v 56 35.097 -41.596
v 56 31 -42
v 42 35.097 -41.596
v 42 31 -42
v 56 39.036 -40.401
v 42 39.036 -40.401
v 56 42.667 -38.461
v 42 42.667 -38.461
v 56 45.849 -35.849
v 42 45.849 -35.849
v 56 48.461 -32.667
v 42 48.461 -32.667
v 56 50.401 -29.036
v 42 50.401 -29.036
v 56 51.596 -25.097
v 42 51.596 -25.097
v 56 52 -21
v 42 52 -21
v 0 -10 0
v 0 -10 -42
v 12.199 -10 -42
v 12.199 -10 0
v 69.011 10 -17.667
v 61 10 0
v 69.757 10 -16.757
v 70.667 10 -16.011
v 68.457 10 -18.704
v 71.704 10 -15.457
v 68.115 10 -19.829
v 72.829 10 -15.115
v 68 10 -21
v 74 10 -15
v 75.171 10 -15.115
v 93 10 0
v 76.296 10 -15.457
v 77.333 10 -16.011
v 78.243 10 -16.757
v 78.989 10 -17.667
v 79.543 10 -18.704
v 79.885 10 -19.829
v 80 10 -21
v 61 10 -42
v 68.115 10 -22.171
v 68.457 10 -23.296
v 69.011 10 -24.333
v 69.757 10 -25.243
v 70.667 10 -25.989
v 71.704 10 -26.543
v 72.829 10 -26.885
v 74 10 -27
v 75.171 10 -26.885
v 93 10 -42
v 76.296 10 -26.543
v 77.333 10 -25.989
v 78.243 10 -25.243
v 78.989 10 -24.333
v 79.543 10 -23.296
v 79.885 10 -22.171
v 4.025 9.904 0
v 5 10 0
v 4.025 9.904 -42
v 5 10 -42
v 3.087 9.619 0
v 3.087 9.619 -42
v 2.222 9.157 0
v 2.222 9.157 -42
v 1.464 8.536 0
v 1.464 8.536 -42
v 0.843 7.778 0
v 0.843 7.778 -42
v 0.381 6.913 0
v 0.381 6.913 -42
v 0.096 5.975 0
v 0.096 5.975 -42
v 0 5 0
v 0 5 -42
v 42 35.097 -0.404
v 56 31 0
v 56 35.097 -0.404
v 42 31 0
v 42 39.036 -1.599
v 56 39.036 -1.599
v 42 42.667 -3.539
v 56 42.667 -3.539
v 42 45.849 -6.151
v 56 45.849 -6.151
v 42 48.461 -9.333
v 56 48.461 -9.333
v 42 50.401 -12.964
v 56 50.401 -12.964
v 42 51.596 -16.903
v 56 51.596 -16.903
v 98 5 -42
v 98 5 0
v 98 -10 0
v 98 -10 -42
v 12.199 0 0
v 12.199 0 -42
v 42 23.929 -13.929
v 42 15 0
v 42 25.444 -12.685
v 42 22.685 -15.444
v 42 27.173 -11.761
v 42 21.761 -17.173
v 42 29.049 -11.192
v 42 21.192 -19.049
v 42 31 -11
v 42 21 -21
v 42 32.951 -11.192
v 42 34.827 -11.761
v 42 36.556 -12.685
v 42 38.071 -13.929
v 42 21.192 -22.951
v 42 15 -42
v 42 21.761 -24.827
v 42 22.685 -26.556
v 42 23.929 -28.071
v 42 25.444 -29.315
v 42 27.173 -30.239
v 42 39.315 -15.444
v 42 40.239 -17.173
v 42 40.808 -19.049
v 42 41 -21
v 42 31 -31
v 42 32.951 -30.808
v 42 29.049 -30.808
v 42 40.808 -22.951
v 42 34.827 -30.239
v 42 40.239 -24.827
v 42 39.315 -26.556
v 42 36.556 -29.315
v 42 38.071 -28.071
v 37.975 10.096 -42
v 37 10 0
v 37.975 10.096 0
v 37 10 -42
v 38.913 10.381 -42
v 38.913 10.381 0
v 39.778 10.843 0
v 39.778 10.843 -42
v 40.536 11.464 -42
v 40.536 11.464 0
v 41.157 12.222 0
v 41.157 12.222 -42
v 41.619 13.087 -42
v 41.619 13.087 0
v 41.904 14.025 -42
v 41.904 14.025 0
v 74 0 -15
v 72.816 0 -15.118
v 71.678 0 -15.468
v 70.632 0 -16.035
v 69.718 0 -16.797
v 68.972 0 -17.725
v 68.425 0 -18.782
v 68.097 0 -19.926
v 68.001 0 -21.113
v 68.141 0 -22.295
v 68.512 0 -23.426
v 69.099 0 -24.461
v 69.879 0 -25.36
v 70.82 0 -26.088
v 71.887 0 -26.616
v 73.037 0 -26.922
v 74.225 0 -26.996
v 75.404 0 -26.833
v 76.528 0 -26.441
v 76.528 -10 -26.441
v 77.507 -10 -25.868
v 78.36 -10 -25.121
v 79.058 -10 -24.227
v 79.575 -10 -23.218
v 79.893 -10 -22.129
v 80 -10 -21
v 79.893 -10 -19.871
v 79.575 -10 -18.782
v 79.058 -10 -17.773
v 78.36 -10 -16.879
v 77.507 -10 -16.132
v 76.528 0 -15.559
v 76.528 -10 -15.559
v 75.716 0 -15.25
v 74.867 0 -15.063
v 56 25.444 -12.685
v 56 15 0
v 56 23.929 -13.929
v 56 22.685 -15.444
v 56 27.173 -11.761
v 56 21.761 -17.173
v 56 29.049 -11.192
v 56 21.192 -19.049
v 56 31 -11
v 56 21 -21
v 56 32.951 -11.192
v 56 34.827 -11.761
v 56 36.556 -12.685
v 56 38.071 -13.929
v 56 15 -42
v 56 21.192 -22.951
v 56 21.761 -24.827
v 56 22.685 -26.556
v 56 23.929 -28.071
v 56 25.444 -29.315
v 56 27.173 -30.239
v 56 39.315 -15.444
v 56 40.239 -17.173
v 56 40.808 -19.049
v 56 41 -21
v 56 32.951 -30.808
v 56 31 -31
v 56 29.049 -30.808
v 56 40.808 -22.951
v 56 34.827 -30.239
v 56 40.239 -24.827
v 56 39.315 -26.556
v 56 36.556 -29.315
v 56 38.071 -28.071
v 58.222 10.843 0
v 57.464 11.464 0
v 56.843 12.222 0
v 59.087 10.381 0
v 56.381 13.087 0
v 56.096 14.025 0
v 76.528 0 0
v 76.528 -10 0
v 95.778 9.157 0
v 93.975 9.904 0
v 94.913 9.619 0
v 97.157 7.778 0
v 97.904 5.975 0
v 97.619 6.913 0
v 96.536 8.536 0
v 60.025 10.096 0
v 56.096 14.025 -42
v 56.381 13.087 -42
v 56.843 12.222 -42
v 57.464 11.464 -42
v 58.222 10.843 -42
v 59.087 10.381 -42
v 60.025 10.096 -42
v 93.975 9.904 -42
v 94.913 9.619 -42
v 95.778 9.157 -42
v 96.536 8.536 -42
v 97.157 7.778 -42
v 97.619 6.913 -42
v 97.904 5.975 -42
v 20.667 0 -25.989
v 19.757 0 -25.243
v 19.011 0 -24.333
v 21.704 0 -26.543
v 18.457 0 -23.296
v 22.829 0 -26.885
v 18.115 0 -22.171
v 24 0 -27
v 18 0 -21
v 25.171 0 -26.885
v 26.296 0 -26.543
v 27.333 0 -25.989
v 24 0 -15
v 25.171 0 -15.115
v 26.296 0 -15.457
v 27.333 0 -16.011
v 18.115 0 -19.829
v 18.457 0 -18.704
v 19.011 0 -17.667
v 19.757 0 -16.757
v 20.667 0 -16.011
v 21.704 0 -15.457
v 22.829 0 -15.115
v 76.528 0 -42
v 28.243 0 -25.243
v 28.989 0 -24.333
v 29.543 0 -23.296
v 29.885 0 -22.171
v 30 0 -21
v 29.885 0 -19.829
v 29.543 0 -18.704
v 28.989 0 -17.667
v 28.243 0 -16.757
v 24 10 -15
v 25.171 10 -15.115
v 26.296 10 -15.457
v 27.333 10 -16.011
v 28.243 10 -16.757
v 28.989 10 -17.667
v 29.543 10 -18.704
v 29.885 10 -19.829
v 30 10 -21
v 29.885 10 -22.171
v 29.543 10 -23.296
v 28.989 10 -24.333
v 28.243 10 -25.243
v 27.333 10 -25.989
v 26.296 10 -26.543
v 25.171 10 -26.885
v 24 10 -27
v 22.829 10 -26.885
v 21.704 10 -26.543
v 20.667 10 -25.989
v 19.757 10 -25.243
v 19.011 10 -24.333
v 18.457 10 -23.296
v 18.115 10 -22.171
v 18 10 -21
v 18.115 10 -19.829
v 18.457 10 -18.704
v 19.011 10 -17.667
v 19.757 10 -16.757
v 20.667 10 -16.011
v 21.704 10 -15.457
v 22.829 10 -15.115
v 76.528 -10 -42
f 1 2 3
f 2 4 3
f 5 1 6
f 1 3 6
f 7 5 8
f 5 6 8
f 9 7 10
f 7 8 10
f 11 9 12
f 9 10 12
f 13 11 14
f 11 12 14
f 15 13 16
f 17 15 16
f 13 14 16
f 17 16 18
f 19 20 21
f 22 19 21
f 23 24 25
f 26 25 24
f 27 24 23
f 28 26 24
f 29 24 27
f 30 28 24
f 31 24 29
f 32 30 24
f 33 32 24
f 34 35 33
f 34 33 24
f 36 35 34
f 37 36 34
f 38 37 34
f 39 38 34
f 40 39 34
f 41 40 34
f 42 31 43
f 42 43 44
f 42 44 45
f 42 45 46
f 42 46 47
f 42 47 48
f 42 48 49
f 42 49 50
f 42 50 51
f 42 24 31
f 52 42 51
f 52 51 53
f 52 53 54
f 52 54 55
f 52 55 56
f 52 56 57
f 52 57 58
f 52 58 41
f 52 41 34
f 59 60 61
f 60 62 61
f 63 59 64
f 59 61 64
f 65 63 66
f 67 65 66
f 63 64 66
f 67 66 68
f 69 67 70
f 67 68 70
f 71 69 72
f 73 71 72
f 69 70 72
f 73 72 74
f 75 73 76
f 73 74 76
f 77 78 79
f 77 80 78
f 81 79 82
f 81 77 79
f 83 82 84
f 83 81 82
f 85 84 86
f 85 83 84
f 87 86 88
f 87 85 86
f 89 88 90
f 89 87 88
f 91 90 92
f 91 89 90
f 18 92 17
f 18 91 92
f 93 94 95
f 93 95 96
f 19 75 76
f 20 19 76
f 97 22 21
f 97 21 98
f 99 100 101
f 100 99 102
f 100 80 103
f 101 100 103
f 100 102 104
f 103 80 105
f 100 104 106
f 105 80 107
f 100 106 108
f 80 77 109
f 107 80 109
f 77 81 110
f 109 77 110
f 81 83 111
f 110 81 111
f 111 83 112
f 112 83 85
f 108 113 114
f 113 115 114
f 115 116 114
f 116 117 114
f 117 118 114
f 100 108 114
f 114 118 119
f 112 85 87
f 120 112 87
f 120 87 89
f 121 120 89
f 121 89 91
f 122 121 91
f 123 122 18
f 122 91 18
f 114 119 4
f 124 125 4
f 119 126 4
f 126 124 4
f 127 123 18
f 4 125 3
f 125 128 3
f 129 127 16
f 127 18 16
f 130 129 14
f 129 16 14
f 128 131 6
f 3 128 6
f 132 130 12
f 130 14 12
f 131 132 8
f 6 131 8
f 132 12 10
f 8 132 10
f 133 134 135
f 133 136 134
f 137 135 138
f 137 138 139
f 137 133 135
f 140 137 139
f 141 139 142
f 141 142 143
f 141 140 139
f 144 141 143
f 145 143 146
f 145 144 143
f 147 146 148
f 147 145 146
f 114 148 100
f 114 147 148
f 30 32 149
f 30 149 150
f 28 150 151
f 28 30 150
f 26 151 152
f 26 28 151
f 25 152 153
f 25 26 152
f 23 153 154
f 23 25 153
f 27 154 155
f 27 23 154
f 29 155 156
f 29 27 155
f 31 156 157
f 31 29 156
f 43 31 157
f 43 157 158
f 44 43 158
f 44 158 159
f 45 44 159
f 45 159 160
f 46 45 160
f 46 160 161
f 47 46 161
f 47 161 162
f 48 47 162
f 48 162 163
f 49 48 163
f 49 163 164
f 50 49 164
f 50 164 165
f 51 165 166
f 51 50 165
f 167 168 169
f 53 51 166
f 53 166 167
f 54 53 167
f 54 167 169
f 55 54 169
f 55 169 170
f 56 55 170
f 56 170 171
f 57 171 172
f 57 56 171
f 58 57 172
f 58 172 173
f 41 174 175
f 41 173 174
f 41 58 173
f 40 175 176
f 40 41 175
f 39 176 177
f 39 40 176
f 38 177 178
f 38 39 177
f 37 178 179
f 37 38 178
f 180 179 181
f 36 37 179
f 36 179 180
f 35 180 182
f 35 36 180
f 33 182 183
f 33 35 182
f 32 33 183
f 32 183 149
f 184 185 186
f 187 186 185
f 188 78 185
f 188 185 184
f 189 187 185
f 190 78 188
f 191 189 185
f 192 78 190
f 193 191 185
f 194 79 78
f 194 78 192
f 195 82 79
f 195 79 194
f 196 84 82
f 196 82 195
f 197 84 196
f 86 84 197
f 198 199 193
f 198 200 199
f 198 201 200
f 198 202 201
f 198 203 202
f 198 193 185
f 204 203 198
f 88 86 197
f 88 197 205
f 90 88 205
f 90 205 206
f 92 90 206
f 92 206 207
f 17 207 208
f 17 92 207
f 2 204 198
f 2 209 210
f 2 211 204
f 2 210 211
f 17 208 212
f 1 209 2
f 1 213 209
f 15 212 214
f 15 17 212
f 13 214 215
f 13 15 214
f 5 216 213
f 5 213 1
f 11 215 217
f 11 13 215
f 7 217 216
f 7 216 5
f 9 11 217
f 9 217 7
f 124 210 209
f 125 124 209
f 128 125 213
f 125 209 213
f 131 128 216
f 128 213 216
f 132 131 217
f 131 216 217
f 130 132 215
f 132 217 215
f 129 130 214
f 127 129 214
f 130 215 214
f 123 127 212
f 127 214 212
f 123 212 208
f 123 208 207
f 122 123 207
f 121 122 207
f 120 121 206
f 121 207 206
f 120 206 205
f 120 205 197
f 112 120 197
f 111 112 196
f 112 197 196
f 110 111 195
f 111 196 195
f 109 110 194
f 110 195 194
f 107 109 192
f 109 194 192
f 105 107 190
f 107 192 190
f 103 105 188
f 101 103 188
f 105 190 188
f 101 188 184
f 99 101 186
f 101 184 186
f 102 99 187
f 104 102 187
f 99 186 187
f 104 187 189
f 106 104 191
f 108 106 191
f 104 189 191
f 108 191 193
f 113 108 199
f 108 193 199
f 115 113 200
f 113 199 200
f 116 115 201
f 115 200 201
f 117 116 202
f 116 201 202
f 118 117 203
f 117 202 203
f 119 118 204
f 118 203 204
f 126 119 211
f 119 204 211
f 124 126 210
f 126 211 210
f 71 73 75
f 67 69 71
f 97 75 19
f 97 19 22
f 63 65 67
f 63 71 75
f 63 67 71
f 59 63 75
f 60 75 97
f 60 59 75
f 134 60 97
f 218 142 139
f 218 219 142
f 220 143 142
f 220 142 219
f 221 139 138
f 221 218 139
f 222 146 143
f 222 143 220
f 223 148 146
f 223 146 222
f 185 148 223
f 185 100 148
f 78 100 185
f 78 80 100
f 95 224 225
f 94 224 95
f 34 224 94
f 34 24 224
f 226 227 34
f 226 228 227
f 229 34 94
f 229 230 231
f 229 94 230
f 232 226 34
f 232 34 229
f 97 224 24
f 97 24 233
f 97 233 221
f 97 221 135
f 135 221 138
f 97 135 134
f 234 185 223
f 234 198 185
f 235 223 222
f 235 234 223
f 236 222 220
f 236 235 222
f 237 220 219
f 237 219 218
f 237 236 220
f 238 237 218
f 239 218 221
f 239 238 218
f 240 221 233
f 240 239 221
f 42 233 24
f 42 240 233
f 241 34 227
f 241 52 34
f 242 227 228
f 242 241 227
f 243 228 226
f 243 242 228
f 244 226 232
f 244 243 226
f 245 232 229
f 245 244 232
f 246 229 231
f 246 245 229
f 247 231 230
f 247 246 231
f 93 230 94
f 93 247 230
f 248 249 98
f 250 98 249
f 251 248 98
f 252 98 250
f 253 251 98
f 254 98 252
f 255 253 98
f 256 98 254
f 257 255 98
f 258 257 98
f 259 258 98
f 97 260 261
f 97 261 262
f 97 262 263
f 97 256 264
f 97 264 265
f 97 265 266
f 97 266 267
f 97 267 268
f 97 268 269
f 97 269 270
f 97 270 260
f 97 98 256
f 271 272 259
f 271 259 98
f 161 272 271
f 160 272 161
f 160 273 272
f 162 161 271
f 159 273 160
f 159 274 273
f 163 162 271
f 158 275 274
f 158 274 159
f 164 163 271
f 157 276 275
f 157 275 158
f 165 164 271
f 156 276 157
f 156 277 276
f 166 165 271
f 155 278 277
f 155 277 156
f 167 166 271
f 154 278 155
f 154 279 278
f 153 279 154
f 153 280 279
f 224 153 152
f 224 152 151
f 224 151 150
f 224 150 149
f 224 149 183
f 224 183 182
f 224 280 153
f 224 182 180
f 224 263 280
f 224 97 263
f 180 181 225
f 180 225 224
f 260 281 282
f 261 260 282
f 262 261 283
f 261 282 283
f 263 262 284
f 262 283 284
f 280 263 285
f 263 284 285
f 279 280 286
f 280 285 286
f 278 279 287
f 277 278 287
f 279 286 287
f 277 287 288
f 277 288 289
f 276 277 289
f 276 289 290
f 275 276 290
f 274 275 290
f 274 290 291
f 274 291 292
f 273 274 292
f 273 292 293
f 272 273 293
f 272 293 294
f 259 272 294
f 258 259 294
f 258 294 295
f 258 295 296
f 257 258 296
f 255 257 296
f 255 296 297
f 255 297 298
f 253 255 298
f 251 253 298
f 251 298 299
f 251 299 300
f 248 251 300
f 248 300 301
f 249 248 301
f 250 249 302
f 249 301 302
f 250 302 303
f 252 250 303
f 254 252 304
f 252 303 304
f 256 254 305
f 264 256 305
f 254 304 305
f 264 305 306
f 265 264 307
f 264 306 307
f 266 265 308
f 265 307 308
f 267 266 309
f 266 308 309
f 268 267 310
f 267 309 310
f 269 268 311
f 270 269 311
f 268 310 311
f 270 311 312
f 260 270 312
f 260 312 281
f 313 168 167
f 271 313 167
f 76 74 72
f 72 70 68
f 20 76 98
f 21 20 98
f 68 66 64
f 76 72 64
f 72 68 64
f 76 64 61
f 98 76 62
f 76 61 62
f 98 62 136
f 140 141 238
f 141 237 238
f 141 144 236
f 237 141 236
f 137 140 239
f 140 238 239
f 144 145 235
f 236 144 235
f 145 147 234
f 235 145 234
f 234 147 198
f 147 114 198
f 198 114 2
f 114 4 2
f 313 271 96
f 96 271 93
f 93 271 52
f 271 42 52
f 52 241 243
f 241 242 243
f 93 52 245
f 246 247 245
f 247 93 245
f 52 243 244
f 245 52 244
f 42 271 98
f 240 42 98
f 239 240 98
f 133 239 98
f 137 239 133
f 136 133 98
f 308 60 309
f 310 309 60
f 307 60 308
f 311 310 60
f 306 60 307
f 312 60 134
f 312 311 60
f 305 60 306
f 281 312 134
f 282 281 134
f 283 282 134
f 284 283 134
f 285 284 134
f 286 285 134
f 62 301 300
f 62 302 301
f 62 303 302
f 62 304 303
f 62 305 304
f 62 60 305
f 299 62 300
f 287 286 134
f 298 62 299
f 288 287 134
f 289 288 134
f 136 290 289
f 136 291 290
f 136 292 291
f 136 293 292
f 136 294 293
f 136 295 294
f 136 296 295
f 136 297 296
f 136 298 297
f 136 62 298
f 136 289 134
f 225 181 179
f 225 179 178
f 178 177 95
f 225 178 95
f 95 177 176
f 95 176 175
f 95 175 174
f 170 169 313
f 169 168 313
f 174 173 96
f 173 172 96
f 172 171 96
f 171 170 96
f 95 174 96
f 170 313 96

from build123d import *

# Parameters (mm, degrees)
SKETCH2_W           = 98
SKETCH2_H           = 42
BOSS_EXTRUDE1_DEPTH = 10
SKETCH3_W           = 64.32909673
SKETCH3_H           = 10
CUT_EXTRUDE3_DEPTH  = 108.088748242
SKETCH4_W           = 42
SKETCH4_H           = 42
BOSS_EXTRUDE2_DEPTH = 7
FILLET1_R           = 21
SKETCH5_R           = 10
CUT_EXTRUDE4_DEPTH  = 14
SKETCH7_R           = 6
CUT_EXTRUDE6_DEPTH  = 115.594938806
FILLET5_R           = 5
FILLET6_R           = 5
FILLET7_R           = 5


with BuildPart() as part:
    # Sketch2 → Boss-Extrude1 (new, symmetric)
    with BuildSketch(Plane(origin=(0, 0, 0), x_dir=(1, 0, 0), z_dir=(0, 1, 0))):
        with Locations((49, 21)):
            Rectangle(SKETCH2_W, SKETCH2_H)
    extrude(amount=BOSS_EXTRUDE1_DEPTH, both=True)

    # Sketch3 → Cut-Extrude3 (cut, through all)
    with BuildSketch(Plane.XY):
        with Locations((44.363668704, -5)):
            Rectangle(SKETCH3_W, SKETCH3_H)
    extrude(amount=-CUT_EXTRUDE3_DEPTH, mode=Mode.SUBTRACT)

    # Sketch4 → Boss-Extrude2 (add, symmetric)
    with BuildSketch(Plane(origin=(49, 0, 0), x_dir=(0, 0, -1), z_dir=(1, 0, 0))):
        with Locations((21, 31)):
            Rectangle(SKETCH4_W, SKETCH4_H)
    extrude(amount=BOSS_EXTRUDE2_DEPTH, both=True)

    # Fillet1
    fillet1_edges = [part.edges().sort_by_distance(p)[0] for p in [
        (49, 52, 0),
        (49, 52, -42),
    ]]
    fillet(fillet1_edges, radius=FILLET1_R - 0.0001)  # a hair under: the kernel refuses the full size

    # Sketch5 → Cut-Extrude4 (cut)
    with BuildSketch(Plane(origin=(56, 0, 0), x_dir=(0, 0, -1), z_dir=(1, 0, 0))):
        with Locations((21, 31)):
            Circle(SKETCH5_R)
    extrude(amount=-CUT_EXTRUDE4_DEPTH, mode=Mode.SUBTRACT)

    # Sketch7 → Cut-Extrude6 (cut, through all)
    with BuildSketch(Plane(origin=(0, 10, 0), x_dir=(1, 0, 0), z_dir=(0, 1, 0))):
        with Locations(Location((24, 21, 0), (0, 0, 270))):
            Circle(SKETCH7_R)
    cut_extrude6 = extrude(amount=-CUT_EXTRUDE6_DEPTH, mode=Mode.SUBTRACT)

    # Mirror3: Cut-Extrude6 across plane
    add(cut_extrude6.mirror(Plane(origin=(49, 0, 0), x_dir=(0, 0, 1), z_dir=(1, 0, 0))), mode=Mode.SUBTRACT)

    # Fillet5
    fillet5_edges = [part.edges().sort_by_distance(p)[0] for p in [
        (98, 10, -21),
    ]]
    fillet(fillet5_edges, radius=FILLET5_R)

    # Fillet6
    fillet6_edges = [part.edges().sort_by_distance(p)[0] for p in [
        (0, 10, -21),
    ]]
    fillet(fillet6_edges, radius=FILLET6_R)

    # Fillet7
    fillet7_edges = [part.edges().sort_by_distance(p)[0] for p in [
        (42, 10, -21),
        (56, 10, -21),
    ]]
    fillet(fillet7_edges, radius=FILLET7_R)


solid = part.part
